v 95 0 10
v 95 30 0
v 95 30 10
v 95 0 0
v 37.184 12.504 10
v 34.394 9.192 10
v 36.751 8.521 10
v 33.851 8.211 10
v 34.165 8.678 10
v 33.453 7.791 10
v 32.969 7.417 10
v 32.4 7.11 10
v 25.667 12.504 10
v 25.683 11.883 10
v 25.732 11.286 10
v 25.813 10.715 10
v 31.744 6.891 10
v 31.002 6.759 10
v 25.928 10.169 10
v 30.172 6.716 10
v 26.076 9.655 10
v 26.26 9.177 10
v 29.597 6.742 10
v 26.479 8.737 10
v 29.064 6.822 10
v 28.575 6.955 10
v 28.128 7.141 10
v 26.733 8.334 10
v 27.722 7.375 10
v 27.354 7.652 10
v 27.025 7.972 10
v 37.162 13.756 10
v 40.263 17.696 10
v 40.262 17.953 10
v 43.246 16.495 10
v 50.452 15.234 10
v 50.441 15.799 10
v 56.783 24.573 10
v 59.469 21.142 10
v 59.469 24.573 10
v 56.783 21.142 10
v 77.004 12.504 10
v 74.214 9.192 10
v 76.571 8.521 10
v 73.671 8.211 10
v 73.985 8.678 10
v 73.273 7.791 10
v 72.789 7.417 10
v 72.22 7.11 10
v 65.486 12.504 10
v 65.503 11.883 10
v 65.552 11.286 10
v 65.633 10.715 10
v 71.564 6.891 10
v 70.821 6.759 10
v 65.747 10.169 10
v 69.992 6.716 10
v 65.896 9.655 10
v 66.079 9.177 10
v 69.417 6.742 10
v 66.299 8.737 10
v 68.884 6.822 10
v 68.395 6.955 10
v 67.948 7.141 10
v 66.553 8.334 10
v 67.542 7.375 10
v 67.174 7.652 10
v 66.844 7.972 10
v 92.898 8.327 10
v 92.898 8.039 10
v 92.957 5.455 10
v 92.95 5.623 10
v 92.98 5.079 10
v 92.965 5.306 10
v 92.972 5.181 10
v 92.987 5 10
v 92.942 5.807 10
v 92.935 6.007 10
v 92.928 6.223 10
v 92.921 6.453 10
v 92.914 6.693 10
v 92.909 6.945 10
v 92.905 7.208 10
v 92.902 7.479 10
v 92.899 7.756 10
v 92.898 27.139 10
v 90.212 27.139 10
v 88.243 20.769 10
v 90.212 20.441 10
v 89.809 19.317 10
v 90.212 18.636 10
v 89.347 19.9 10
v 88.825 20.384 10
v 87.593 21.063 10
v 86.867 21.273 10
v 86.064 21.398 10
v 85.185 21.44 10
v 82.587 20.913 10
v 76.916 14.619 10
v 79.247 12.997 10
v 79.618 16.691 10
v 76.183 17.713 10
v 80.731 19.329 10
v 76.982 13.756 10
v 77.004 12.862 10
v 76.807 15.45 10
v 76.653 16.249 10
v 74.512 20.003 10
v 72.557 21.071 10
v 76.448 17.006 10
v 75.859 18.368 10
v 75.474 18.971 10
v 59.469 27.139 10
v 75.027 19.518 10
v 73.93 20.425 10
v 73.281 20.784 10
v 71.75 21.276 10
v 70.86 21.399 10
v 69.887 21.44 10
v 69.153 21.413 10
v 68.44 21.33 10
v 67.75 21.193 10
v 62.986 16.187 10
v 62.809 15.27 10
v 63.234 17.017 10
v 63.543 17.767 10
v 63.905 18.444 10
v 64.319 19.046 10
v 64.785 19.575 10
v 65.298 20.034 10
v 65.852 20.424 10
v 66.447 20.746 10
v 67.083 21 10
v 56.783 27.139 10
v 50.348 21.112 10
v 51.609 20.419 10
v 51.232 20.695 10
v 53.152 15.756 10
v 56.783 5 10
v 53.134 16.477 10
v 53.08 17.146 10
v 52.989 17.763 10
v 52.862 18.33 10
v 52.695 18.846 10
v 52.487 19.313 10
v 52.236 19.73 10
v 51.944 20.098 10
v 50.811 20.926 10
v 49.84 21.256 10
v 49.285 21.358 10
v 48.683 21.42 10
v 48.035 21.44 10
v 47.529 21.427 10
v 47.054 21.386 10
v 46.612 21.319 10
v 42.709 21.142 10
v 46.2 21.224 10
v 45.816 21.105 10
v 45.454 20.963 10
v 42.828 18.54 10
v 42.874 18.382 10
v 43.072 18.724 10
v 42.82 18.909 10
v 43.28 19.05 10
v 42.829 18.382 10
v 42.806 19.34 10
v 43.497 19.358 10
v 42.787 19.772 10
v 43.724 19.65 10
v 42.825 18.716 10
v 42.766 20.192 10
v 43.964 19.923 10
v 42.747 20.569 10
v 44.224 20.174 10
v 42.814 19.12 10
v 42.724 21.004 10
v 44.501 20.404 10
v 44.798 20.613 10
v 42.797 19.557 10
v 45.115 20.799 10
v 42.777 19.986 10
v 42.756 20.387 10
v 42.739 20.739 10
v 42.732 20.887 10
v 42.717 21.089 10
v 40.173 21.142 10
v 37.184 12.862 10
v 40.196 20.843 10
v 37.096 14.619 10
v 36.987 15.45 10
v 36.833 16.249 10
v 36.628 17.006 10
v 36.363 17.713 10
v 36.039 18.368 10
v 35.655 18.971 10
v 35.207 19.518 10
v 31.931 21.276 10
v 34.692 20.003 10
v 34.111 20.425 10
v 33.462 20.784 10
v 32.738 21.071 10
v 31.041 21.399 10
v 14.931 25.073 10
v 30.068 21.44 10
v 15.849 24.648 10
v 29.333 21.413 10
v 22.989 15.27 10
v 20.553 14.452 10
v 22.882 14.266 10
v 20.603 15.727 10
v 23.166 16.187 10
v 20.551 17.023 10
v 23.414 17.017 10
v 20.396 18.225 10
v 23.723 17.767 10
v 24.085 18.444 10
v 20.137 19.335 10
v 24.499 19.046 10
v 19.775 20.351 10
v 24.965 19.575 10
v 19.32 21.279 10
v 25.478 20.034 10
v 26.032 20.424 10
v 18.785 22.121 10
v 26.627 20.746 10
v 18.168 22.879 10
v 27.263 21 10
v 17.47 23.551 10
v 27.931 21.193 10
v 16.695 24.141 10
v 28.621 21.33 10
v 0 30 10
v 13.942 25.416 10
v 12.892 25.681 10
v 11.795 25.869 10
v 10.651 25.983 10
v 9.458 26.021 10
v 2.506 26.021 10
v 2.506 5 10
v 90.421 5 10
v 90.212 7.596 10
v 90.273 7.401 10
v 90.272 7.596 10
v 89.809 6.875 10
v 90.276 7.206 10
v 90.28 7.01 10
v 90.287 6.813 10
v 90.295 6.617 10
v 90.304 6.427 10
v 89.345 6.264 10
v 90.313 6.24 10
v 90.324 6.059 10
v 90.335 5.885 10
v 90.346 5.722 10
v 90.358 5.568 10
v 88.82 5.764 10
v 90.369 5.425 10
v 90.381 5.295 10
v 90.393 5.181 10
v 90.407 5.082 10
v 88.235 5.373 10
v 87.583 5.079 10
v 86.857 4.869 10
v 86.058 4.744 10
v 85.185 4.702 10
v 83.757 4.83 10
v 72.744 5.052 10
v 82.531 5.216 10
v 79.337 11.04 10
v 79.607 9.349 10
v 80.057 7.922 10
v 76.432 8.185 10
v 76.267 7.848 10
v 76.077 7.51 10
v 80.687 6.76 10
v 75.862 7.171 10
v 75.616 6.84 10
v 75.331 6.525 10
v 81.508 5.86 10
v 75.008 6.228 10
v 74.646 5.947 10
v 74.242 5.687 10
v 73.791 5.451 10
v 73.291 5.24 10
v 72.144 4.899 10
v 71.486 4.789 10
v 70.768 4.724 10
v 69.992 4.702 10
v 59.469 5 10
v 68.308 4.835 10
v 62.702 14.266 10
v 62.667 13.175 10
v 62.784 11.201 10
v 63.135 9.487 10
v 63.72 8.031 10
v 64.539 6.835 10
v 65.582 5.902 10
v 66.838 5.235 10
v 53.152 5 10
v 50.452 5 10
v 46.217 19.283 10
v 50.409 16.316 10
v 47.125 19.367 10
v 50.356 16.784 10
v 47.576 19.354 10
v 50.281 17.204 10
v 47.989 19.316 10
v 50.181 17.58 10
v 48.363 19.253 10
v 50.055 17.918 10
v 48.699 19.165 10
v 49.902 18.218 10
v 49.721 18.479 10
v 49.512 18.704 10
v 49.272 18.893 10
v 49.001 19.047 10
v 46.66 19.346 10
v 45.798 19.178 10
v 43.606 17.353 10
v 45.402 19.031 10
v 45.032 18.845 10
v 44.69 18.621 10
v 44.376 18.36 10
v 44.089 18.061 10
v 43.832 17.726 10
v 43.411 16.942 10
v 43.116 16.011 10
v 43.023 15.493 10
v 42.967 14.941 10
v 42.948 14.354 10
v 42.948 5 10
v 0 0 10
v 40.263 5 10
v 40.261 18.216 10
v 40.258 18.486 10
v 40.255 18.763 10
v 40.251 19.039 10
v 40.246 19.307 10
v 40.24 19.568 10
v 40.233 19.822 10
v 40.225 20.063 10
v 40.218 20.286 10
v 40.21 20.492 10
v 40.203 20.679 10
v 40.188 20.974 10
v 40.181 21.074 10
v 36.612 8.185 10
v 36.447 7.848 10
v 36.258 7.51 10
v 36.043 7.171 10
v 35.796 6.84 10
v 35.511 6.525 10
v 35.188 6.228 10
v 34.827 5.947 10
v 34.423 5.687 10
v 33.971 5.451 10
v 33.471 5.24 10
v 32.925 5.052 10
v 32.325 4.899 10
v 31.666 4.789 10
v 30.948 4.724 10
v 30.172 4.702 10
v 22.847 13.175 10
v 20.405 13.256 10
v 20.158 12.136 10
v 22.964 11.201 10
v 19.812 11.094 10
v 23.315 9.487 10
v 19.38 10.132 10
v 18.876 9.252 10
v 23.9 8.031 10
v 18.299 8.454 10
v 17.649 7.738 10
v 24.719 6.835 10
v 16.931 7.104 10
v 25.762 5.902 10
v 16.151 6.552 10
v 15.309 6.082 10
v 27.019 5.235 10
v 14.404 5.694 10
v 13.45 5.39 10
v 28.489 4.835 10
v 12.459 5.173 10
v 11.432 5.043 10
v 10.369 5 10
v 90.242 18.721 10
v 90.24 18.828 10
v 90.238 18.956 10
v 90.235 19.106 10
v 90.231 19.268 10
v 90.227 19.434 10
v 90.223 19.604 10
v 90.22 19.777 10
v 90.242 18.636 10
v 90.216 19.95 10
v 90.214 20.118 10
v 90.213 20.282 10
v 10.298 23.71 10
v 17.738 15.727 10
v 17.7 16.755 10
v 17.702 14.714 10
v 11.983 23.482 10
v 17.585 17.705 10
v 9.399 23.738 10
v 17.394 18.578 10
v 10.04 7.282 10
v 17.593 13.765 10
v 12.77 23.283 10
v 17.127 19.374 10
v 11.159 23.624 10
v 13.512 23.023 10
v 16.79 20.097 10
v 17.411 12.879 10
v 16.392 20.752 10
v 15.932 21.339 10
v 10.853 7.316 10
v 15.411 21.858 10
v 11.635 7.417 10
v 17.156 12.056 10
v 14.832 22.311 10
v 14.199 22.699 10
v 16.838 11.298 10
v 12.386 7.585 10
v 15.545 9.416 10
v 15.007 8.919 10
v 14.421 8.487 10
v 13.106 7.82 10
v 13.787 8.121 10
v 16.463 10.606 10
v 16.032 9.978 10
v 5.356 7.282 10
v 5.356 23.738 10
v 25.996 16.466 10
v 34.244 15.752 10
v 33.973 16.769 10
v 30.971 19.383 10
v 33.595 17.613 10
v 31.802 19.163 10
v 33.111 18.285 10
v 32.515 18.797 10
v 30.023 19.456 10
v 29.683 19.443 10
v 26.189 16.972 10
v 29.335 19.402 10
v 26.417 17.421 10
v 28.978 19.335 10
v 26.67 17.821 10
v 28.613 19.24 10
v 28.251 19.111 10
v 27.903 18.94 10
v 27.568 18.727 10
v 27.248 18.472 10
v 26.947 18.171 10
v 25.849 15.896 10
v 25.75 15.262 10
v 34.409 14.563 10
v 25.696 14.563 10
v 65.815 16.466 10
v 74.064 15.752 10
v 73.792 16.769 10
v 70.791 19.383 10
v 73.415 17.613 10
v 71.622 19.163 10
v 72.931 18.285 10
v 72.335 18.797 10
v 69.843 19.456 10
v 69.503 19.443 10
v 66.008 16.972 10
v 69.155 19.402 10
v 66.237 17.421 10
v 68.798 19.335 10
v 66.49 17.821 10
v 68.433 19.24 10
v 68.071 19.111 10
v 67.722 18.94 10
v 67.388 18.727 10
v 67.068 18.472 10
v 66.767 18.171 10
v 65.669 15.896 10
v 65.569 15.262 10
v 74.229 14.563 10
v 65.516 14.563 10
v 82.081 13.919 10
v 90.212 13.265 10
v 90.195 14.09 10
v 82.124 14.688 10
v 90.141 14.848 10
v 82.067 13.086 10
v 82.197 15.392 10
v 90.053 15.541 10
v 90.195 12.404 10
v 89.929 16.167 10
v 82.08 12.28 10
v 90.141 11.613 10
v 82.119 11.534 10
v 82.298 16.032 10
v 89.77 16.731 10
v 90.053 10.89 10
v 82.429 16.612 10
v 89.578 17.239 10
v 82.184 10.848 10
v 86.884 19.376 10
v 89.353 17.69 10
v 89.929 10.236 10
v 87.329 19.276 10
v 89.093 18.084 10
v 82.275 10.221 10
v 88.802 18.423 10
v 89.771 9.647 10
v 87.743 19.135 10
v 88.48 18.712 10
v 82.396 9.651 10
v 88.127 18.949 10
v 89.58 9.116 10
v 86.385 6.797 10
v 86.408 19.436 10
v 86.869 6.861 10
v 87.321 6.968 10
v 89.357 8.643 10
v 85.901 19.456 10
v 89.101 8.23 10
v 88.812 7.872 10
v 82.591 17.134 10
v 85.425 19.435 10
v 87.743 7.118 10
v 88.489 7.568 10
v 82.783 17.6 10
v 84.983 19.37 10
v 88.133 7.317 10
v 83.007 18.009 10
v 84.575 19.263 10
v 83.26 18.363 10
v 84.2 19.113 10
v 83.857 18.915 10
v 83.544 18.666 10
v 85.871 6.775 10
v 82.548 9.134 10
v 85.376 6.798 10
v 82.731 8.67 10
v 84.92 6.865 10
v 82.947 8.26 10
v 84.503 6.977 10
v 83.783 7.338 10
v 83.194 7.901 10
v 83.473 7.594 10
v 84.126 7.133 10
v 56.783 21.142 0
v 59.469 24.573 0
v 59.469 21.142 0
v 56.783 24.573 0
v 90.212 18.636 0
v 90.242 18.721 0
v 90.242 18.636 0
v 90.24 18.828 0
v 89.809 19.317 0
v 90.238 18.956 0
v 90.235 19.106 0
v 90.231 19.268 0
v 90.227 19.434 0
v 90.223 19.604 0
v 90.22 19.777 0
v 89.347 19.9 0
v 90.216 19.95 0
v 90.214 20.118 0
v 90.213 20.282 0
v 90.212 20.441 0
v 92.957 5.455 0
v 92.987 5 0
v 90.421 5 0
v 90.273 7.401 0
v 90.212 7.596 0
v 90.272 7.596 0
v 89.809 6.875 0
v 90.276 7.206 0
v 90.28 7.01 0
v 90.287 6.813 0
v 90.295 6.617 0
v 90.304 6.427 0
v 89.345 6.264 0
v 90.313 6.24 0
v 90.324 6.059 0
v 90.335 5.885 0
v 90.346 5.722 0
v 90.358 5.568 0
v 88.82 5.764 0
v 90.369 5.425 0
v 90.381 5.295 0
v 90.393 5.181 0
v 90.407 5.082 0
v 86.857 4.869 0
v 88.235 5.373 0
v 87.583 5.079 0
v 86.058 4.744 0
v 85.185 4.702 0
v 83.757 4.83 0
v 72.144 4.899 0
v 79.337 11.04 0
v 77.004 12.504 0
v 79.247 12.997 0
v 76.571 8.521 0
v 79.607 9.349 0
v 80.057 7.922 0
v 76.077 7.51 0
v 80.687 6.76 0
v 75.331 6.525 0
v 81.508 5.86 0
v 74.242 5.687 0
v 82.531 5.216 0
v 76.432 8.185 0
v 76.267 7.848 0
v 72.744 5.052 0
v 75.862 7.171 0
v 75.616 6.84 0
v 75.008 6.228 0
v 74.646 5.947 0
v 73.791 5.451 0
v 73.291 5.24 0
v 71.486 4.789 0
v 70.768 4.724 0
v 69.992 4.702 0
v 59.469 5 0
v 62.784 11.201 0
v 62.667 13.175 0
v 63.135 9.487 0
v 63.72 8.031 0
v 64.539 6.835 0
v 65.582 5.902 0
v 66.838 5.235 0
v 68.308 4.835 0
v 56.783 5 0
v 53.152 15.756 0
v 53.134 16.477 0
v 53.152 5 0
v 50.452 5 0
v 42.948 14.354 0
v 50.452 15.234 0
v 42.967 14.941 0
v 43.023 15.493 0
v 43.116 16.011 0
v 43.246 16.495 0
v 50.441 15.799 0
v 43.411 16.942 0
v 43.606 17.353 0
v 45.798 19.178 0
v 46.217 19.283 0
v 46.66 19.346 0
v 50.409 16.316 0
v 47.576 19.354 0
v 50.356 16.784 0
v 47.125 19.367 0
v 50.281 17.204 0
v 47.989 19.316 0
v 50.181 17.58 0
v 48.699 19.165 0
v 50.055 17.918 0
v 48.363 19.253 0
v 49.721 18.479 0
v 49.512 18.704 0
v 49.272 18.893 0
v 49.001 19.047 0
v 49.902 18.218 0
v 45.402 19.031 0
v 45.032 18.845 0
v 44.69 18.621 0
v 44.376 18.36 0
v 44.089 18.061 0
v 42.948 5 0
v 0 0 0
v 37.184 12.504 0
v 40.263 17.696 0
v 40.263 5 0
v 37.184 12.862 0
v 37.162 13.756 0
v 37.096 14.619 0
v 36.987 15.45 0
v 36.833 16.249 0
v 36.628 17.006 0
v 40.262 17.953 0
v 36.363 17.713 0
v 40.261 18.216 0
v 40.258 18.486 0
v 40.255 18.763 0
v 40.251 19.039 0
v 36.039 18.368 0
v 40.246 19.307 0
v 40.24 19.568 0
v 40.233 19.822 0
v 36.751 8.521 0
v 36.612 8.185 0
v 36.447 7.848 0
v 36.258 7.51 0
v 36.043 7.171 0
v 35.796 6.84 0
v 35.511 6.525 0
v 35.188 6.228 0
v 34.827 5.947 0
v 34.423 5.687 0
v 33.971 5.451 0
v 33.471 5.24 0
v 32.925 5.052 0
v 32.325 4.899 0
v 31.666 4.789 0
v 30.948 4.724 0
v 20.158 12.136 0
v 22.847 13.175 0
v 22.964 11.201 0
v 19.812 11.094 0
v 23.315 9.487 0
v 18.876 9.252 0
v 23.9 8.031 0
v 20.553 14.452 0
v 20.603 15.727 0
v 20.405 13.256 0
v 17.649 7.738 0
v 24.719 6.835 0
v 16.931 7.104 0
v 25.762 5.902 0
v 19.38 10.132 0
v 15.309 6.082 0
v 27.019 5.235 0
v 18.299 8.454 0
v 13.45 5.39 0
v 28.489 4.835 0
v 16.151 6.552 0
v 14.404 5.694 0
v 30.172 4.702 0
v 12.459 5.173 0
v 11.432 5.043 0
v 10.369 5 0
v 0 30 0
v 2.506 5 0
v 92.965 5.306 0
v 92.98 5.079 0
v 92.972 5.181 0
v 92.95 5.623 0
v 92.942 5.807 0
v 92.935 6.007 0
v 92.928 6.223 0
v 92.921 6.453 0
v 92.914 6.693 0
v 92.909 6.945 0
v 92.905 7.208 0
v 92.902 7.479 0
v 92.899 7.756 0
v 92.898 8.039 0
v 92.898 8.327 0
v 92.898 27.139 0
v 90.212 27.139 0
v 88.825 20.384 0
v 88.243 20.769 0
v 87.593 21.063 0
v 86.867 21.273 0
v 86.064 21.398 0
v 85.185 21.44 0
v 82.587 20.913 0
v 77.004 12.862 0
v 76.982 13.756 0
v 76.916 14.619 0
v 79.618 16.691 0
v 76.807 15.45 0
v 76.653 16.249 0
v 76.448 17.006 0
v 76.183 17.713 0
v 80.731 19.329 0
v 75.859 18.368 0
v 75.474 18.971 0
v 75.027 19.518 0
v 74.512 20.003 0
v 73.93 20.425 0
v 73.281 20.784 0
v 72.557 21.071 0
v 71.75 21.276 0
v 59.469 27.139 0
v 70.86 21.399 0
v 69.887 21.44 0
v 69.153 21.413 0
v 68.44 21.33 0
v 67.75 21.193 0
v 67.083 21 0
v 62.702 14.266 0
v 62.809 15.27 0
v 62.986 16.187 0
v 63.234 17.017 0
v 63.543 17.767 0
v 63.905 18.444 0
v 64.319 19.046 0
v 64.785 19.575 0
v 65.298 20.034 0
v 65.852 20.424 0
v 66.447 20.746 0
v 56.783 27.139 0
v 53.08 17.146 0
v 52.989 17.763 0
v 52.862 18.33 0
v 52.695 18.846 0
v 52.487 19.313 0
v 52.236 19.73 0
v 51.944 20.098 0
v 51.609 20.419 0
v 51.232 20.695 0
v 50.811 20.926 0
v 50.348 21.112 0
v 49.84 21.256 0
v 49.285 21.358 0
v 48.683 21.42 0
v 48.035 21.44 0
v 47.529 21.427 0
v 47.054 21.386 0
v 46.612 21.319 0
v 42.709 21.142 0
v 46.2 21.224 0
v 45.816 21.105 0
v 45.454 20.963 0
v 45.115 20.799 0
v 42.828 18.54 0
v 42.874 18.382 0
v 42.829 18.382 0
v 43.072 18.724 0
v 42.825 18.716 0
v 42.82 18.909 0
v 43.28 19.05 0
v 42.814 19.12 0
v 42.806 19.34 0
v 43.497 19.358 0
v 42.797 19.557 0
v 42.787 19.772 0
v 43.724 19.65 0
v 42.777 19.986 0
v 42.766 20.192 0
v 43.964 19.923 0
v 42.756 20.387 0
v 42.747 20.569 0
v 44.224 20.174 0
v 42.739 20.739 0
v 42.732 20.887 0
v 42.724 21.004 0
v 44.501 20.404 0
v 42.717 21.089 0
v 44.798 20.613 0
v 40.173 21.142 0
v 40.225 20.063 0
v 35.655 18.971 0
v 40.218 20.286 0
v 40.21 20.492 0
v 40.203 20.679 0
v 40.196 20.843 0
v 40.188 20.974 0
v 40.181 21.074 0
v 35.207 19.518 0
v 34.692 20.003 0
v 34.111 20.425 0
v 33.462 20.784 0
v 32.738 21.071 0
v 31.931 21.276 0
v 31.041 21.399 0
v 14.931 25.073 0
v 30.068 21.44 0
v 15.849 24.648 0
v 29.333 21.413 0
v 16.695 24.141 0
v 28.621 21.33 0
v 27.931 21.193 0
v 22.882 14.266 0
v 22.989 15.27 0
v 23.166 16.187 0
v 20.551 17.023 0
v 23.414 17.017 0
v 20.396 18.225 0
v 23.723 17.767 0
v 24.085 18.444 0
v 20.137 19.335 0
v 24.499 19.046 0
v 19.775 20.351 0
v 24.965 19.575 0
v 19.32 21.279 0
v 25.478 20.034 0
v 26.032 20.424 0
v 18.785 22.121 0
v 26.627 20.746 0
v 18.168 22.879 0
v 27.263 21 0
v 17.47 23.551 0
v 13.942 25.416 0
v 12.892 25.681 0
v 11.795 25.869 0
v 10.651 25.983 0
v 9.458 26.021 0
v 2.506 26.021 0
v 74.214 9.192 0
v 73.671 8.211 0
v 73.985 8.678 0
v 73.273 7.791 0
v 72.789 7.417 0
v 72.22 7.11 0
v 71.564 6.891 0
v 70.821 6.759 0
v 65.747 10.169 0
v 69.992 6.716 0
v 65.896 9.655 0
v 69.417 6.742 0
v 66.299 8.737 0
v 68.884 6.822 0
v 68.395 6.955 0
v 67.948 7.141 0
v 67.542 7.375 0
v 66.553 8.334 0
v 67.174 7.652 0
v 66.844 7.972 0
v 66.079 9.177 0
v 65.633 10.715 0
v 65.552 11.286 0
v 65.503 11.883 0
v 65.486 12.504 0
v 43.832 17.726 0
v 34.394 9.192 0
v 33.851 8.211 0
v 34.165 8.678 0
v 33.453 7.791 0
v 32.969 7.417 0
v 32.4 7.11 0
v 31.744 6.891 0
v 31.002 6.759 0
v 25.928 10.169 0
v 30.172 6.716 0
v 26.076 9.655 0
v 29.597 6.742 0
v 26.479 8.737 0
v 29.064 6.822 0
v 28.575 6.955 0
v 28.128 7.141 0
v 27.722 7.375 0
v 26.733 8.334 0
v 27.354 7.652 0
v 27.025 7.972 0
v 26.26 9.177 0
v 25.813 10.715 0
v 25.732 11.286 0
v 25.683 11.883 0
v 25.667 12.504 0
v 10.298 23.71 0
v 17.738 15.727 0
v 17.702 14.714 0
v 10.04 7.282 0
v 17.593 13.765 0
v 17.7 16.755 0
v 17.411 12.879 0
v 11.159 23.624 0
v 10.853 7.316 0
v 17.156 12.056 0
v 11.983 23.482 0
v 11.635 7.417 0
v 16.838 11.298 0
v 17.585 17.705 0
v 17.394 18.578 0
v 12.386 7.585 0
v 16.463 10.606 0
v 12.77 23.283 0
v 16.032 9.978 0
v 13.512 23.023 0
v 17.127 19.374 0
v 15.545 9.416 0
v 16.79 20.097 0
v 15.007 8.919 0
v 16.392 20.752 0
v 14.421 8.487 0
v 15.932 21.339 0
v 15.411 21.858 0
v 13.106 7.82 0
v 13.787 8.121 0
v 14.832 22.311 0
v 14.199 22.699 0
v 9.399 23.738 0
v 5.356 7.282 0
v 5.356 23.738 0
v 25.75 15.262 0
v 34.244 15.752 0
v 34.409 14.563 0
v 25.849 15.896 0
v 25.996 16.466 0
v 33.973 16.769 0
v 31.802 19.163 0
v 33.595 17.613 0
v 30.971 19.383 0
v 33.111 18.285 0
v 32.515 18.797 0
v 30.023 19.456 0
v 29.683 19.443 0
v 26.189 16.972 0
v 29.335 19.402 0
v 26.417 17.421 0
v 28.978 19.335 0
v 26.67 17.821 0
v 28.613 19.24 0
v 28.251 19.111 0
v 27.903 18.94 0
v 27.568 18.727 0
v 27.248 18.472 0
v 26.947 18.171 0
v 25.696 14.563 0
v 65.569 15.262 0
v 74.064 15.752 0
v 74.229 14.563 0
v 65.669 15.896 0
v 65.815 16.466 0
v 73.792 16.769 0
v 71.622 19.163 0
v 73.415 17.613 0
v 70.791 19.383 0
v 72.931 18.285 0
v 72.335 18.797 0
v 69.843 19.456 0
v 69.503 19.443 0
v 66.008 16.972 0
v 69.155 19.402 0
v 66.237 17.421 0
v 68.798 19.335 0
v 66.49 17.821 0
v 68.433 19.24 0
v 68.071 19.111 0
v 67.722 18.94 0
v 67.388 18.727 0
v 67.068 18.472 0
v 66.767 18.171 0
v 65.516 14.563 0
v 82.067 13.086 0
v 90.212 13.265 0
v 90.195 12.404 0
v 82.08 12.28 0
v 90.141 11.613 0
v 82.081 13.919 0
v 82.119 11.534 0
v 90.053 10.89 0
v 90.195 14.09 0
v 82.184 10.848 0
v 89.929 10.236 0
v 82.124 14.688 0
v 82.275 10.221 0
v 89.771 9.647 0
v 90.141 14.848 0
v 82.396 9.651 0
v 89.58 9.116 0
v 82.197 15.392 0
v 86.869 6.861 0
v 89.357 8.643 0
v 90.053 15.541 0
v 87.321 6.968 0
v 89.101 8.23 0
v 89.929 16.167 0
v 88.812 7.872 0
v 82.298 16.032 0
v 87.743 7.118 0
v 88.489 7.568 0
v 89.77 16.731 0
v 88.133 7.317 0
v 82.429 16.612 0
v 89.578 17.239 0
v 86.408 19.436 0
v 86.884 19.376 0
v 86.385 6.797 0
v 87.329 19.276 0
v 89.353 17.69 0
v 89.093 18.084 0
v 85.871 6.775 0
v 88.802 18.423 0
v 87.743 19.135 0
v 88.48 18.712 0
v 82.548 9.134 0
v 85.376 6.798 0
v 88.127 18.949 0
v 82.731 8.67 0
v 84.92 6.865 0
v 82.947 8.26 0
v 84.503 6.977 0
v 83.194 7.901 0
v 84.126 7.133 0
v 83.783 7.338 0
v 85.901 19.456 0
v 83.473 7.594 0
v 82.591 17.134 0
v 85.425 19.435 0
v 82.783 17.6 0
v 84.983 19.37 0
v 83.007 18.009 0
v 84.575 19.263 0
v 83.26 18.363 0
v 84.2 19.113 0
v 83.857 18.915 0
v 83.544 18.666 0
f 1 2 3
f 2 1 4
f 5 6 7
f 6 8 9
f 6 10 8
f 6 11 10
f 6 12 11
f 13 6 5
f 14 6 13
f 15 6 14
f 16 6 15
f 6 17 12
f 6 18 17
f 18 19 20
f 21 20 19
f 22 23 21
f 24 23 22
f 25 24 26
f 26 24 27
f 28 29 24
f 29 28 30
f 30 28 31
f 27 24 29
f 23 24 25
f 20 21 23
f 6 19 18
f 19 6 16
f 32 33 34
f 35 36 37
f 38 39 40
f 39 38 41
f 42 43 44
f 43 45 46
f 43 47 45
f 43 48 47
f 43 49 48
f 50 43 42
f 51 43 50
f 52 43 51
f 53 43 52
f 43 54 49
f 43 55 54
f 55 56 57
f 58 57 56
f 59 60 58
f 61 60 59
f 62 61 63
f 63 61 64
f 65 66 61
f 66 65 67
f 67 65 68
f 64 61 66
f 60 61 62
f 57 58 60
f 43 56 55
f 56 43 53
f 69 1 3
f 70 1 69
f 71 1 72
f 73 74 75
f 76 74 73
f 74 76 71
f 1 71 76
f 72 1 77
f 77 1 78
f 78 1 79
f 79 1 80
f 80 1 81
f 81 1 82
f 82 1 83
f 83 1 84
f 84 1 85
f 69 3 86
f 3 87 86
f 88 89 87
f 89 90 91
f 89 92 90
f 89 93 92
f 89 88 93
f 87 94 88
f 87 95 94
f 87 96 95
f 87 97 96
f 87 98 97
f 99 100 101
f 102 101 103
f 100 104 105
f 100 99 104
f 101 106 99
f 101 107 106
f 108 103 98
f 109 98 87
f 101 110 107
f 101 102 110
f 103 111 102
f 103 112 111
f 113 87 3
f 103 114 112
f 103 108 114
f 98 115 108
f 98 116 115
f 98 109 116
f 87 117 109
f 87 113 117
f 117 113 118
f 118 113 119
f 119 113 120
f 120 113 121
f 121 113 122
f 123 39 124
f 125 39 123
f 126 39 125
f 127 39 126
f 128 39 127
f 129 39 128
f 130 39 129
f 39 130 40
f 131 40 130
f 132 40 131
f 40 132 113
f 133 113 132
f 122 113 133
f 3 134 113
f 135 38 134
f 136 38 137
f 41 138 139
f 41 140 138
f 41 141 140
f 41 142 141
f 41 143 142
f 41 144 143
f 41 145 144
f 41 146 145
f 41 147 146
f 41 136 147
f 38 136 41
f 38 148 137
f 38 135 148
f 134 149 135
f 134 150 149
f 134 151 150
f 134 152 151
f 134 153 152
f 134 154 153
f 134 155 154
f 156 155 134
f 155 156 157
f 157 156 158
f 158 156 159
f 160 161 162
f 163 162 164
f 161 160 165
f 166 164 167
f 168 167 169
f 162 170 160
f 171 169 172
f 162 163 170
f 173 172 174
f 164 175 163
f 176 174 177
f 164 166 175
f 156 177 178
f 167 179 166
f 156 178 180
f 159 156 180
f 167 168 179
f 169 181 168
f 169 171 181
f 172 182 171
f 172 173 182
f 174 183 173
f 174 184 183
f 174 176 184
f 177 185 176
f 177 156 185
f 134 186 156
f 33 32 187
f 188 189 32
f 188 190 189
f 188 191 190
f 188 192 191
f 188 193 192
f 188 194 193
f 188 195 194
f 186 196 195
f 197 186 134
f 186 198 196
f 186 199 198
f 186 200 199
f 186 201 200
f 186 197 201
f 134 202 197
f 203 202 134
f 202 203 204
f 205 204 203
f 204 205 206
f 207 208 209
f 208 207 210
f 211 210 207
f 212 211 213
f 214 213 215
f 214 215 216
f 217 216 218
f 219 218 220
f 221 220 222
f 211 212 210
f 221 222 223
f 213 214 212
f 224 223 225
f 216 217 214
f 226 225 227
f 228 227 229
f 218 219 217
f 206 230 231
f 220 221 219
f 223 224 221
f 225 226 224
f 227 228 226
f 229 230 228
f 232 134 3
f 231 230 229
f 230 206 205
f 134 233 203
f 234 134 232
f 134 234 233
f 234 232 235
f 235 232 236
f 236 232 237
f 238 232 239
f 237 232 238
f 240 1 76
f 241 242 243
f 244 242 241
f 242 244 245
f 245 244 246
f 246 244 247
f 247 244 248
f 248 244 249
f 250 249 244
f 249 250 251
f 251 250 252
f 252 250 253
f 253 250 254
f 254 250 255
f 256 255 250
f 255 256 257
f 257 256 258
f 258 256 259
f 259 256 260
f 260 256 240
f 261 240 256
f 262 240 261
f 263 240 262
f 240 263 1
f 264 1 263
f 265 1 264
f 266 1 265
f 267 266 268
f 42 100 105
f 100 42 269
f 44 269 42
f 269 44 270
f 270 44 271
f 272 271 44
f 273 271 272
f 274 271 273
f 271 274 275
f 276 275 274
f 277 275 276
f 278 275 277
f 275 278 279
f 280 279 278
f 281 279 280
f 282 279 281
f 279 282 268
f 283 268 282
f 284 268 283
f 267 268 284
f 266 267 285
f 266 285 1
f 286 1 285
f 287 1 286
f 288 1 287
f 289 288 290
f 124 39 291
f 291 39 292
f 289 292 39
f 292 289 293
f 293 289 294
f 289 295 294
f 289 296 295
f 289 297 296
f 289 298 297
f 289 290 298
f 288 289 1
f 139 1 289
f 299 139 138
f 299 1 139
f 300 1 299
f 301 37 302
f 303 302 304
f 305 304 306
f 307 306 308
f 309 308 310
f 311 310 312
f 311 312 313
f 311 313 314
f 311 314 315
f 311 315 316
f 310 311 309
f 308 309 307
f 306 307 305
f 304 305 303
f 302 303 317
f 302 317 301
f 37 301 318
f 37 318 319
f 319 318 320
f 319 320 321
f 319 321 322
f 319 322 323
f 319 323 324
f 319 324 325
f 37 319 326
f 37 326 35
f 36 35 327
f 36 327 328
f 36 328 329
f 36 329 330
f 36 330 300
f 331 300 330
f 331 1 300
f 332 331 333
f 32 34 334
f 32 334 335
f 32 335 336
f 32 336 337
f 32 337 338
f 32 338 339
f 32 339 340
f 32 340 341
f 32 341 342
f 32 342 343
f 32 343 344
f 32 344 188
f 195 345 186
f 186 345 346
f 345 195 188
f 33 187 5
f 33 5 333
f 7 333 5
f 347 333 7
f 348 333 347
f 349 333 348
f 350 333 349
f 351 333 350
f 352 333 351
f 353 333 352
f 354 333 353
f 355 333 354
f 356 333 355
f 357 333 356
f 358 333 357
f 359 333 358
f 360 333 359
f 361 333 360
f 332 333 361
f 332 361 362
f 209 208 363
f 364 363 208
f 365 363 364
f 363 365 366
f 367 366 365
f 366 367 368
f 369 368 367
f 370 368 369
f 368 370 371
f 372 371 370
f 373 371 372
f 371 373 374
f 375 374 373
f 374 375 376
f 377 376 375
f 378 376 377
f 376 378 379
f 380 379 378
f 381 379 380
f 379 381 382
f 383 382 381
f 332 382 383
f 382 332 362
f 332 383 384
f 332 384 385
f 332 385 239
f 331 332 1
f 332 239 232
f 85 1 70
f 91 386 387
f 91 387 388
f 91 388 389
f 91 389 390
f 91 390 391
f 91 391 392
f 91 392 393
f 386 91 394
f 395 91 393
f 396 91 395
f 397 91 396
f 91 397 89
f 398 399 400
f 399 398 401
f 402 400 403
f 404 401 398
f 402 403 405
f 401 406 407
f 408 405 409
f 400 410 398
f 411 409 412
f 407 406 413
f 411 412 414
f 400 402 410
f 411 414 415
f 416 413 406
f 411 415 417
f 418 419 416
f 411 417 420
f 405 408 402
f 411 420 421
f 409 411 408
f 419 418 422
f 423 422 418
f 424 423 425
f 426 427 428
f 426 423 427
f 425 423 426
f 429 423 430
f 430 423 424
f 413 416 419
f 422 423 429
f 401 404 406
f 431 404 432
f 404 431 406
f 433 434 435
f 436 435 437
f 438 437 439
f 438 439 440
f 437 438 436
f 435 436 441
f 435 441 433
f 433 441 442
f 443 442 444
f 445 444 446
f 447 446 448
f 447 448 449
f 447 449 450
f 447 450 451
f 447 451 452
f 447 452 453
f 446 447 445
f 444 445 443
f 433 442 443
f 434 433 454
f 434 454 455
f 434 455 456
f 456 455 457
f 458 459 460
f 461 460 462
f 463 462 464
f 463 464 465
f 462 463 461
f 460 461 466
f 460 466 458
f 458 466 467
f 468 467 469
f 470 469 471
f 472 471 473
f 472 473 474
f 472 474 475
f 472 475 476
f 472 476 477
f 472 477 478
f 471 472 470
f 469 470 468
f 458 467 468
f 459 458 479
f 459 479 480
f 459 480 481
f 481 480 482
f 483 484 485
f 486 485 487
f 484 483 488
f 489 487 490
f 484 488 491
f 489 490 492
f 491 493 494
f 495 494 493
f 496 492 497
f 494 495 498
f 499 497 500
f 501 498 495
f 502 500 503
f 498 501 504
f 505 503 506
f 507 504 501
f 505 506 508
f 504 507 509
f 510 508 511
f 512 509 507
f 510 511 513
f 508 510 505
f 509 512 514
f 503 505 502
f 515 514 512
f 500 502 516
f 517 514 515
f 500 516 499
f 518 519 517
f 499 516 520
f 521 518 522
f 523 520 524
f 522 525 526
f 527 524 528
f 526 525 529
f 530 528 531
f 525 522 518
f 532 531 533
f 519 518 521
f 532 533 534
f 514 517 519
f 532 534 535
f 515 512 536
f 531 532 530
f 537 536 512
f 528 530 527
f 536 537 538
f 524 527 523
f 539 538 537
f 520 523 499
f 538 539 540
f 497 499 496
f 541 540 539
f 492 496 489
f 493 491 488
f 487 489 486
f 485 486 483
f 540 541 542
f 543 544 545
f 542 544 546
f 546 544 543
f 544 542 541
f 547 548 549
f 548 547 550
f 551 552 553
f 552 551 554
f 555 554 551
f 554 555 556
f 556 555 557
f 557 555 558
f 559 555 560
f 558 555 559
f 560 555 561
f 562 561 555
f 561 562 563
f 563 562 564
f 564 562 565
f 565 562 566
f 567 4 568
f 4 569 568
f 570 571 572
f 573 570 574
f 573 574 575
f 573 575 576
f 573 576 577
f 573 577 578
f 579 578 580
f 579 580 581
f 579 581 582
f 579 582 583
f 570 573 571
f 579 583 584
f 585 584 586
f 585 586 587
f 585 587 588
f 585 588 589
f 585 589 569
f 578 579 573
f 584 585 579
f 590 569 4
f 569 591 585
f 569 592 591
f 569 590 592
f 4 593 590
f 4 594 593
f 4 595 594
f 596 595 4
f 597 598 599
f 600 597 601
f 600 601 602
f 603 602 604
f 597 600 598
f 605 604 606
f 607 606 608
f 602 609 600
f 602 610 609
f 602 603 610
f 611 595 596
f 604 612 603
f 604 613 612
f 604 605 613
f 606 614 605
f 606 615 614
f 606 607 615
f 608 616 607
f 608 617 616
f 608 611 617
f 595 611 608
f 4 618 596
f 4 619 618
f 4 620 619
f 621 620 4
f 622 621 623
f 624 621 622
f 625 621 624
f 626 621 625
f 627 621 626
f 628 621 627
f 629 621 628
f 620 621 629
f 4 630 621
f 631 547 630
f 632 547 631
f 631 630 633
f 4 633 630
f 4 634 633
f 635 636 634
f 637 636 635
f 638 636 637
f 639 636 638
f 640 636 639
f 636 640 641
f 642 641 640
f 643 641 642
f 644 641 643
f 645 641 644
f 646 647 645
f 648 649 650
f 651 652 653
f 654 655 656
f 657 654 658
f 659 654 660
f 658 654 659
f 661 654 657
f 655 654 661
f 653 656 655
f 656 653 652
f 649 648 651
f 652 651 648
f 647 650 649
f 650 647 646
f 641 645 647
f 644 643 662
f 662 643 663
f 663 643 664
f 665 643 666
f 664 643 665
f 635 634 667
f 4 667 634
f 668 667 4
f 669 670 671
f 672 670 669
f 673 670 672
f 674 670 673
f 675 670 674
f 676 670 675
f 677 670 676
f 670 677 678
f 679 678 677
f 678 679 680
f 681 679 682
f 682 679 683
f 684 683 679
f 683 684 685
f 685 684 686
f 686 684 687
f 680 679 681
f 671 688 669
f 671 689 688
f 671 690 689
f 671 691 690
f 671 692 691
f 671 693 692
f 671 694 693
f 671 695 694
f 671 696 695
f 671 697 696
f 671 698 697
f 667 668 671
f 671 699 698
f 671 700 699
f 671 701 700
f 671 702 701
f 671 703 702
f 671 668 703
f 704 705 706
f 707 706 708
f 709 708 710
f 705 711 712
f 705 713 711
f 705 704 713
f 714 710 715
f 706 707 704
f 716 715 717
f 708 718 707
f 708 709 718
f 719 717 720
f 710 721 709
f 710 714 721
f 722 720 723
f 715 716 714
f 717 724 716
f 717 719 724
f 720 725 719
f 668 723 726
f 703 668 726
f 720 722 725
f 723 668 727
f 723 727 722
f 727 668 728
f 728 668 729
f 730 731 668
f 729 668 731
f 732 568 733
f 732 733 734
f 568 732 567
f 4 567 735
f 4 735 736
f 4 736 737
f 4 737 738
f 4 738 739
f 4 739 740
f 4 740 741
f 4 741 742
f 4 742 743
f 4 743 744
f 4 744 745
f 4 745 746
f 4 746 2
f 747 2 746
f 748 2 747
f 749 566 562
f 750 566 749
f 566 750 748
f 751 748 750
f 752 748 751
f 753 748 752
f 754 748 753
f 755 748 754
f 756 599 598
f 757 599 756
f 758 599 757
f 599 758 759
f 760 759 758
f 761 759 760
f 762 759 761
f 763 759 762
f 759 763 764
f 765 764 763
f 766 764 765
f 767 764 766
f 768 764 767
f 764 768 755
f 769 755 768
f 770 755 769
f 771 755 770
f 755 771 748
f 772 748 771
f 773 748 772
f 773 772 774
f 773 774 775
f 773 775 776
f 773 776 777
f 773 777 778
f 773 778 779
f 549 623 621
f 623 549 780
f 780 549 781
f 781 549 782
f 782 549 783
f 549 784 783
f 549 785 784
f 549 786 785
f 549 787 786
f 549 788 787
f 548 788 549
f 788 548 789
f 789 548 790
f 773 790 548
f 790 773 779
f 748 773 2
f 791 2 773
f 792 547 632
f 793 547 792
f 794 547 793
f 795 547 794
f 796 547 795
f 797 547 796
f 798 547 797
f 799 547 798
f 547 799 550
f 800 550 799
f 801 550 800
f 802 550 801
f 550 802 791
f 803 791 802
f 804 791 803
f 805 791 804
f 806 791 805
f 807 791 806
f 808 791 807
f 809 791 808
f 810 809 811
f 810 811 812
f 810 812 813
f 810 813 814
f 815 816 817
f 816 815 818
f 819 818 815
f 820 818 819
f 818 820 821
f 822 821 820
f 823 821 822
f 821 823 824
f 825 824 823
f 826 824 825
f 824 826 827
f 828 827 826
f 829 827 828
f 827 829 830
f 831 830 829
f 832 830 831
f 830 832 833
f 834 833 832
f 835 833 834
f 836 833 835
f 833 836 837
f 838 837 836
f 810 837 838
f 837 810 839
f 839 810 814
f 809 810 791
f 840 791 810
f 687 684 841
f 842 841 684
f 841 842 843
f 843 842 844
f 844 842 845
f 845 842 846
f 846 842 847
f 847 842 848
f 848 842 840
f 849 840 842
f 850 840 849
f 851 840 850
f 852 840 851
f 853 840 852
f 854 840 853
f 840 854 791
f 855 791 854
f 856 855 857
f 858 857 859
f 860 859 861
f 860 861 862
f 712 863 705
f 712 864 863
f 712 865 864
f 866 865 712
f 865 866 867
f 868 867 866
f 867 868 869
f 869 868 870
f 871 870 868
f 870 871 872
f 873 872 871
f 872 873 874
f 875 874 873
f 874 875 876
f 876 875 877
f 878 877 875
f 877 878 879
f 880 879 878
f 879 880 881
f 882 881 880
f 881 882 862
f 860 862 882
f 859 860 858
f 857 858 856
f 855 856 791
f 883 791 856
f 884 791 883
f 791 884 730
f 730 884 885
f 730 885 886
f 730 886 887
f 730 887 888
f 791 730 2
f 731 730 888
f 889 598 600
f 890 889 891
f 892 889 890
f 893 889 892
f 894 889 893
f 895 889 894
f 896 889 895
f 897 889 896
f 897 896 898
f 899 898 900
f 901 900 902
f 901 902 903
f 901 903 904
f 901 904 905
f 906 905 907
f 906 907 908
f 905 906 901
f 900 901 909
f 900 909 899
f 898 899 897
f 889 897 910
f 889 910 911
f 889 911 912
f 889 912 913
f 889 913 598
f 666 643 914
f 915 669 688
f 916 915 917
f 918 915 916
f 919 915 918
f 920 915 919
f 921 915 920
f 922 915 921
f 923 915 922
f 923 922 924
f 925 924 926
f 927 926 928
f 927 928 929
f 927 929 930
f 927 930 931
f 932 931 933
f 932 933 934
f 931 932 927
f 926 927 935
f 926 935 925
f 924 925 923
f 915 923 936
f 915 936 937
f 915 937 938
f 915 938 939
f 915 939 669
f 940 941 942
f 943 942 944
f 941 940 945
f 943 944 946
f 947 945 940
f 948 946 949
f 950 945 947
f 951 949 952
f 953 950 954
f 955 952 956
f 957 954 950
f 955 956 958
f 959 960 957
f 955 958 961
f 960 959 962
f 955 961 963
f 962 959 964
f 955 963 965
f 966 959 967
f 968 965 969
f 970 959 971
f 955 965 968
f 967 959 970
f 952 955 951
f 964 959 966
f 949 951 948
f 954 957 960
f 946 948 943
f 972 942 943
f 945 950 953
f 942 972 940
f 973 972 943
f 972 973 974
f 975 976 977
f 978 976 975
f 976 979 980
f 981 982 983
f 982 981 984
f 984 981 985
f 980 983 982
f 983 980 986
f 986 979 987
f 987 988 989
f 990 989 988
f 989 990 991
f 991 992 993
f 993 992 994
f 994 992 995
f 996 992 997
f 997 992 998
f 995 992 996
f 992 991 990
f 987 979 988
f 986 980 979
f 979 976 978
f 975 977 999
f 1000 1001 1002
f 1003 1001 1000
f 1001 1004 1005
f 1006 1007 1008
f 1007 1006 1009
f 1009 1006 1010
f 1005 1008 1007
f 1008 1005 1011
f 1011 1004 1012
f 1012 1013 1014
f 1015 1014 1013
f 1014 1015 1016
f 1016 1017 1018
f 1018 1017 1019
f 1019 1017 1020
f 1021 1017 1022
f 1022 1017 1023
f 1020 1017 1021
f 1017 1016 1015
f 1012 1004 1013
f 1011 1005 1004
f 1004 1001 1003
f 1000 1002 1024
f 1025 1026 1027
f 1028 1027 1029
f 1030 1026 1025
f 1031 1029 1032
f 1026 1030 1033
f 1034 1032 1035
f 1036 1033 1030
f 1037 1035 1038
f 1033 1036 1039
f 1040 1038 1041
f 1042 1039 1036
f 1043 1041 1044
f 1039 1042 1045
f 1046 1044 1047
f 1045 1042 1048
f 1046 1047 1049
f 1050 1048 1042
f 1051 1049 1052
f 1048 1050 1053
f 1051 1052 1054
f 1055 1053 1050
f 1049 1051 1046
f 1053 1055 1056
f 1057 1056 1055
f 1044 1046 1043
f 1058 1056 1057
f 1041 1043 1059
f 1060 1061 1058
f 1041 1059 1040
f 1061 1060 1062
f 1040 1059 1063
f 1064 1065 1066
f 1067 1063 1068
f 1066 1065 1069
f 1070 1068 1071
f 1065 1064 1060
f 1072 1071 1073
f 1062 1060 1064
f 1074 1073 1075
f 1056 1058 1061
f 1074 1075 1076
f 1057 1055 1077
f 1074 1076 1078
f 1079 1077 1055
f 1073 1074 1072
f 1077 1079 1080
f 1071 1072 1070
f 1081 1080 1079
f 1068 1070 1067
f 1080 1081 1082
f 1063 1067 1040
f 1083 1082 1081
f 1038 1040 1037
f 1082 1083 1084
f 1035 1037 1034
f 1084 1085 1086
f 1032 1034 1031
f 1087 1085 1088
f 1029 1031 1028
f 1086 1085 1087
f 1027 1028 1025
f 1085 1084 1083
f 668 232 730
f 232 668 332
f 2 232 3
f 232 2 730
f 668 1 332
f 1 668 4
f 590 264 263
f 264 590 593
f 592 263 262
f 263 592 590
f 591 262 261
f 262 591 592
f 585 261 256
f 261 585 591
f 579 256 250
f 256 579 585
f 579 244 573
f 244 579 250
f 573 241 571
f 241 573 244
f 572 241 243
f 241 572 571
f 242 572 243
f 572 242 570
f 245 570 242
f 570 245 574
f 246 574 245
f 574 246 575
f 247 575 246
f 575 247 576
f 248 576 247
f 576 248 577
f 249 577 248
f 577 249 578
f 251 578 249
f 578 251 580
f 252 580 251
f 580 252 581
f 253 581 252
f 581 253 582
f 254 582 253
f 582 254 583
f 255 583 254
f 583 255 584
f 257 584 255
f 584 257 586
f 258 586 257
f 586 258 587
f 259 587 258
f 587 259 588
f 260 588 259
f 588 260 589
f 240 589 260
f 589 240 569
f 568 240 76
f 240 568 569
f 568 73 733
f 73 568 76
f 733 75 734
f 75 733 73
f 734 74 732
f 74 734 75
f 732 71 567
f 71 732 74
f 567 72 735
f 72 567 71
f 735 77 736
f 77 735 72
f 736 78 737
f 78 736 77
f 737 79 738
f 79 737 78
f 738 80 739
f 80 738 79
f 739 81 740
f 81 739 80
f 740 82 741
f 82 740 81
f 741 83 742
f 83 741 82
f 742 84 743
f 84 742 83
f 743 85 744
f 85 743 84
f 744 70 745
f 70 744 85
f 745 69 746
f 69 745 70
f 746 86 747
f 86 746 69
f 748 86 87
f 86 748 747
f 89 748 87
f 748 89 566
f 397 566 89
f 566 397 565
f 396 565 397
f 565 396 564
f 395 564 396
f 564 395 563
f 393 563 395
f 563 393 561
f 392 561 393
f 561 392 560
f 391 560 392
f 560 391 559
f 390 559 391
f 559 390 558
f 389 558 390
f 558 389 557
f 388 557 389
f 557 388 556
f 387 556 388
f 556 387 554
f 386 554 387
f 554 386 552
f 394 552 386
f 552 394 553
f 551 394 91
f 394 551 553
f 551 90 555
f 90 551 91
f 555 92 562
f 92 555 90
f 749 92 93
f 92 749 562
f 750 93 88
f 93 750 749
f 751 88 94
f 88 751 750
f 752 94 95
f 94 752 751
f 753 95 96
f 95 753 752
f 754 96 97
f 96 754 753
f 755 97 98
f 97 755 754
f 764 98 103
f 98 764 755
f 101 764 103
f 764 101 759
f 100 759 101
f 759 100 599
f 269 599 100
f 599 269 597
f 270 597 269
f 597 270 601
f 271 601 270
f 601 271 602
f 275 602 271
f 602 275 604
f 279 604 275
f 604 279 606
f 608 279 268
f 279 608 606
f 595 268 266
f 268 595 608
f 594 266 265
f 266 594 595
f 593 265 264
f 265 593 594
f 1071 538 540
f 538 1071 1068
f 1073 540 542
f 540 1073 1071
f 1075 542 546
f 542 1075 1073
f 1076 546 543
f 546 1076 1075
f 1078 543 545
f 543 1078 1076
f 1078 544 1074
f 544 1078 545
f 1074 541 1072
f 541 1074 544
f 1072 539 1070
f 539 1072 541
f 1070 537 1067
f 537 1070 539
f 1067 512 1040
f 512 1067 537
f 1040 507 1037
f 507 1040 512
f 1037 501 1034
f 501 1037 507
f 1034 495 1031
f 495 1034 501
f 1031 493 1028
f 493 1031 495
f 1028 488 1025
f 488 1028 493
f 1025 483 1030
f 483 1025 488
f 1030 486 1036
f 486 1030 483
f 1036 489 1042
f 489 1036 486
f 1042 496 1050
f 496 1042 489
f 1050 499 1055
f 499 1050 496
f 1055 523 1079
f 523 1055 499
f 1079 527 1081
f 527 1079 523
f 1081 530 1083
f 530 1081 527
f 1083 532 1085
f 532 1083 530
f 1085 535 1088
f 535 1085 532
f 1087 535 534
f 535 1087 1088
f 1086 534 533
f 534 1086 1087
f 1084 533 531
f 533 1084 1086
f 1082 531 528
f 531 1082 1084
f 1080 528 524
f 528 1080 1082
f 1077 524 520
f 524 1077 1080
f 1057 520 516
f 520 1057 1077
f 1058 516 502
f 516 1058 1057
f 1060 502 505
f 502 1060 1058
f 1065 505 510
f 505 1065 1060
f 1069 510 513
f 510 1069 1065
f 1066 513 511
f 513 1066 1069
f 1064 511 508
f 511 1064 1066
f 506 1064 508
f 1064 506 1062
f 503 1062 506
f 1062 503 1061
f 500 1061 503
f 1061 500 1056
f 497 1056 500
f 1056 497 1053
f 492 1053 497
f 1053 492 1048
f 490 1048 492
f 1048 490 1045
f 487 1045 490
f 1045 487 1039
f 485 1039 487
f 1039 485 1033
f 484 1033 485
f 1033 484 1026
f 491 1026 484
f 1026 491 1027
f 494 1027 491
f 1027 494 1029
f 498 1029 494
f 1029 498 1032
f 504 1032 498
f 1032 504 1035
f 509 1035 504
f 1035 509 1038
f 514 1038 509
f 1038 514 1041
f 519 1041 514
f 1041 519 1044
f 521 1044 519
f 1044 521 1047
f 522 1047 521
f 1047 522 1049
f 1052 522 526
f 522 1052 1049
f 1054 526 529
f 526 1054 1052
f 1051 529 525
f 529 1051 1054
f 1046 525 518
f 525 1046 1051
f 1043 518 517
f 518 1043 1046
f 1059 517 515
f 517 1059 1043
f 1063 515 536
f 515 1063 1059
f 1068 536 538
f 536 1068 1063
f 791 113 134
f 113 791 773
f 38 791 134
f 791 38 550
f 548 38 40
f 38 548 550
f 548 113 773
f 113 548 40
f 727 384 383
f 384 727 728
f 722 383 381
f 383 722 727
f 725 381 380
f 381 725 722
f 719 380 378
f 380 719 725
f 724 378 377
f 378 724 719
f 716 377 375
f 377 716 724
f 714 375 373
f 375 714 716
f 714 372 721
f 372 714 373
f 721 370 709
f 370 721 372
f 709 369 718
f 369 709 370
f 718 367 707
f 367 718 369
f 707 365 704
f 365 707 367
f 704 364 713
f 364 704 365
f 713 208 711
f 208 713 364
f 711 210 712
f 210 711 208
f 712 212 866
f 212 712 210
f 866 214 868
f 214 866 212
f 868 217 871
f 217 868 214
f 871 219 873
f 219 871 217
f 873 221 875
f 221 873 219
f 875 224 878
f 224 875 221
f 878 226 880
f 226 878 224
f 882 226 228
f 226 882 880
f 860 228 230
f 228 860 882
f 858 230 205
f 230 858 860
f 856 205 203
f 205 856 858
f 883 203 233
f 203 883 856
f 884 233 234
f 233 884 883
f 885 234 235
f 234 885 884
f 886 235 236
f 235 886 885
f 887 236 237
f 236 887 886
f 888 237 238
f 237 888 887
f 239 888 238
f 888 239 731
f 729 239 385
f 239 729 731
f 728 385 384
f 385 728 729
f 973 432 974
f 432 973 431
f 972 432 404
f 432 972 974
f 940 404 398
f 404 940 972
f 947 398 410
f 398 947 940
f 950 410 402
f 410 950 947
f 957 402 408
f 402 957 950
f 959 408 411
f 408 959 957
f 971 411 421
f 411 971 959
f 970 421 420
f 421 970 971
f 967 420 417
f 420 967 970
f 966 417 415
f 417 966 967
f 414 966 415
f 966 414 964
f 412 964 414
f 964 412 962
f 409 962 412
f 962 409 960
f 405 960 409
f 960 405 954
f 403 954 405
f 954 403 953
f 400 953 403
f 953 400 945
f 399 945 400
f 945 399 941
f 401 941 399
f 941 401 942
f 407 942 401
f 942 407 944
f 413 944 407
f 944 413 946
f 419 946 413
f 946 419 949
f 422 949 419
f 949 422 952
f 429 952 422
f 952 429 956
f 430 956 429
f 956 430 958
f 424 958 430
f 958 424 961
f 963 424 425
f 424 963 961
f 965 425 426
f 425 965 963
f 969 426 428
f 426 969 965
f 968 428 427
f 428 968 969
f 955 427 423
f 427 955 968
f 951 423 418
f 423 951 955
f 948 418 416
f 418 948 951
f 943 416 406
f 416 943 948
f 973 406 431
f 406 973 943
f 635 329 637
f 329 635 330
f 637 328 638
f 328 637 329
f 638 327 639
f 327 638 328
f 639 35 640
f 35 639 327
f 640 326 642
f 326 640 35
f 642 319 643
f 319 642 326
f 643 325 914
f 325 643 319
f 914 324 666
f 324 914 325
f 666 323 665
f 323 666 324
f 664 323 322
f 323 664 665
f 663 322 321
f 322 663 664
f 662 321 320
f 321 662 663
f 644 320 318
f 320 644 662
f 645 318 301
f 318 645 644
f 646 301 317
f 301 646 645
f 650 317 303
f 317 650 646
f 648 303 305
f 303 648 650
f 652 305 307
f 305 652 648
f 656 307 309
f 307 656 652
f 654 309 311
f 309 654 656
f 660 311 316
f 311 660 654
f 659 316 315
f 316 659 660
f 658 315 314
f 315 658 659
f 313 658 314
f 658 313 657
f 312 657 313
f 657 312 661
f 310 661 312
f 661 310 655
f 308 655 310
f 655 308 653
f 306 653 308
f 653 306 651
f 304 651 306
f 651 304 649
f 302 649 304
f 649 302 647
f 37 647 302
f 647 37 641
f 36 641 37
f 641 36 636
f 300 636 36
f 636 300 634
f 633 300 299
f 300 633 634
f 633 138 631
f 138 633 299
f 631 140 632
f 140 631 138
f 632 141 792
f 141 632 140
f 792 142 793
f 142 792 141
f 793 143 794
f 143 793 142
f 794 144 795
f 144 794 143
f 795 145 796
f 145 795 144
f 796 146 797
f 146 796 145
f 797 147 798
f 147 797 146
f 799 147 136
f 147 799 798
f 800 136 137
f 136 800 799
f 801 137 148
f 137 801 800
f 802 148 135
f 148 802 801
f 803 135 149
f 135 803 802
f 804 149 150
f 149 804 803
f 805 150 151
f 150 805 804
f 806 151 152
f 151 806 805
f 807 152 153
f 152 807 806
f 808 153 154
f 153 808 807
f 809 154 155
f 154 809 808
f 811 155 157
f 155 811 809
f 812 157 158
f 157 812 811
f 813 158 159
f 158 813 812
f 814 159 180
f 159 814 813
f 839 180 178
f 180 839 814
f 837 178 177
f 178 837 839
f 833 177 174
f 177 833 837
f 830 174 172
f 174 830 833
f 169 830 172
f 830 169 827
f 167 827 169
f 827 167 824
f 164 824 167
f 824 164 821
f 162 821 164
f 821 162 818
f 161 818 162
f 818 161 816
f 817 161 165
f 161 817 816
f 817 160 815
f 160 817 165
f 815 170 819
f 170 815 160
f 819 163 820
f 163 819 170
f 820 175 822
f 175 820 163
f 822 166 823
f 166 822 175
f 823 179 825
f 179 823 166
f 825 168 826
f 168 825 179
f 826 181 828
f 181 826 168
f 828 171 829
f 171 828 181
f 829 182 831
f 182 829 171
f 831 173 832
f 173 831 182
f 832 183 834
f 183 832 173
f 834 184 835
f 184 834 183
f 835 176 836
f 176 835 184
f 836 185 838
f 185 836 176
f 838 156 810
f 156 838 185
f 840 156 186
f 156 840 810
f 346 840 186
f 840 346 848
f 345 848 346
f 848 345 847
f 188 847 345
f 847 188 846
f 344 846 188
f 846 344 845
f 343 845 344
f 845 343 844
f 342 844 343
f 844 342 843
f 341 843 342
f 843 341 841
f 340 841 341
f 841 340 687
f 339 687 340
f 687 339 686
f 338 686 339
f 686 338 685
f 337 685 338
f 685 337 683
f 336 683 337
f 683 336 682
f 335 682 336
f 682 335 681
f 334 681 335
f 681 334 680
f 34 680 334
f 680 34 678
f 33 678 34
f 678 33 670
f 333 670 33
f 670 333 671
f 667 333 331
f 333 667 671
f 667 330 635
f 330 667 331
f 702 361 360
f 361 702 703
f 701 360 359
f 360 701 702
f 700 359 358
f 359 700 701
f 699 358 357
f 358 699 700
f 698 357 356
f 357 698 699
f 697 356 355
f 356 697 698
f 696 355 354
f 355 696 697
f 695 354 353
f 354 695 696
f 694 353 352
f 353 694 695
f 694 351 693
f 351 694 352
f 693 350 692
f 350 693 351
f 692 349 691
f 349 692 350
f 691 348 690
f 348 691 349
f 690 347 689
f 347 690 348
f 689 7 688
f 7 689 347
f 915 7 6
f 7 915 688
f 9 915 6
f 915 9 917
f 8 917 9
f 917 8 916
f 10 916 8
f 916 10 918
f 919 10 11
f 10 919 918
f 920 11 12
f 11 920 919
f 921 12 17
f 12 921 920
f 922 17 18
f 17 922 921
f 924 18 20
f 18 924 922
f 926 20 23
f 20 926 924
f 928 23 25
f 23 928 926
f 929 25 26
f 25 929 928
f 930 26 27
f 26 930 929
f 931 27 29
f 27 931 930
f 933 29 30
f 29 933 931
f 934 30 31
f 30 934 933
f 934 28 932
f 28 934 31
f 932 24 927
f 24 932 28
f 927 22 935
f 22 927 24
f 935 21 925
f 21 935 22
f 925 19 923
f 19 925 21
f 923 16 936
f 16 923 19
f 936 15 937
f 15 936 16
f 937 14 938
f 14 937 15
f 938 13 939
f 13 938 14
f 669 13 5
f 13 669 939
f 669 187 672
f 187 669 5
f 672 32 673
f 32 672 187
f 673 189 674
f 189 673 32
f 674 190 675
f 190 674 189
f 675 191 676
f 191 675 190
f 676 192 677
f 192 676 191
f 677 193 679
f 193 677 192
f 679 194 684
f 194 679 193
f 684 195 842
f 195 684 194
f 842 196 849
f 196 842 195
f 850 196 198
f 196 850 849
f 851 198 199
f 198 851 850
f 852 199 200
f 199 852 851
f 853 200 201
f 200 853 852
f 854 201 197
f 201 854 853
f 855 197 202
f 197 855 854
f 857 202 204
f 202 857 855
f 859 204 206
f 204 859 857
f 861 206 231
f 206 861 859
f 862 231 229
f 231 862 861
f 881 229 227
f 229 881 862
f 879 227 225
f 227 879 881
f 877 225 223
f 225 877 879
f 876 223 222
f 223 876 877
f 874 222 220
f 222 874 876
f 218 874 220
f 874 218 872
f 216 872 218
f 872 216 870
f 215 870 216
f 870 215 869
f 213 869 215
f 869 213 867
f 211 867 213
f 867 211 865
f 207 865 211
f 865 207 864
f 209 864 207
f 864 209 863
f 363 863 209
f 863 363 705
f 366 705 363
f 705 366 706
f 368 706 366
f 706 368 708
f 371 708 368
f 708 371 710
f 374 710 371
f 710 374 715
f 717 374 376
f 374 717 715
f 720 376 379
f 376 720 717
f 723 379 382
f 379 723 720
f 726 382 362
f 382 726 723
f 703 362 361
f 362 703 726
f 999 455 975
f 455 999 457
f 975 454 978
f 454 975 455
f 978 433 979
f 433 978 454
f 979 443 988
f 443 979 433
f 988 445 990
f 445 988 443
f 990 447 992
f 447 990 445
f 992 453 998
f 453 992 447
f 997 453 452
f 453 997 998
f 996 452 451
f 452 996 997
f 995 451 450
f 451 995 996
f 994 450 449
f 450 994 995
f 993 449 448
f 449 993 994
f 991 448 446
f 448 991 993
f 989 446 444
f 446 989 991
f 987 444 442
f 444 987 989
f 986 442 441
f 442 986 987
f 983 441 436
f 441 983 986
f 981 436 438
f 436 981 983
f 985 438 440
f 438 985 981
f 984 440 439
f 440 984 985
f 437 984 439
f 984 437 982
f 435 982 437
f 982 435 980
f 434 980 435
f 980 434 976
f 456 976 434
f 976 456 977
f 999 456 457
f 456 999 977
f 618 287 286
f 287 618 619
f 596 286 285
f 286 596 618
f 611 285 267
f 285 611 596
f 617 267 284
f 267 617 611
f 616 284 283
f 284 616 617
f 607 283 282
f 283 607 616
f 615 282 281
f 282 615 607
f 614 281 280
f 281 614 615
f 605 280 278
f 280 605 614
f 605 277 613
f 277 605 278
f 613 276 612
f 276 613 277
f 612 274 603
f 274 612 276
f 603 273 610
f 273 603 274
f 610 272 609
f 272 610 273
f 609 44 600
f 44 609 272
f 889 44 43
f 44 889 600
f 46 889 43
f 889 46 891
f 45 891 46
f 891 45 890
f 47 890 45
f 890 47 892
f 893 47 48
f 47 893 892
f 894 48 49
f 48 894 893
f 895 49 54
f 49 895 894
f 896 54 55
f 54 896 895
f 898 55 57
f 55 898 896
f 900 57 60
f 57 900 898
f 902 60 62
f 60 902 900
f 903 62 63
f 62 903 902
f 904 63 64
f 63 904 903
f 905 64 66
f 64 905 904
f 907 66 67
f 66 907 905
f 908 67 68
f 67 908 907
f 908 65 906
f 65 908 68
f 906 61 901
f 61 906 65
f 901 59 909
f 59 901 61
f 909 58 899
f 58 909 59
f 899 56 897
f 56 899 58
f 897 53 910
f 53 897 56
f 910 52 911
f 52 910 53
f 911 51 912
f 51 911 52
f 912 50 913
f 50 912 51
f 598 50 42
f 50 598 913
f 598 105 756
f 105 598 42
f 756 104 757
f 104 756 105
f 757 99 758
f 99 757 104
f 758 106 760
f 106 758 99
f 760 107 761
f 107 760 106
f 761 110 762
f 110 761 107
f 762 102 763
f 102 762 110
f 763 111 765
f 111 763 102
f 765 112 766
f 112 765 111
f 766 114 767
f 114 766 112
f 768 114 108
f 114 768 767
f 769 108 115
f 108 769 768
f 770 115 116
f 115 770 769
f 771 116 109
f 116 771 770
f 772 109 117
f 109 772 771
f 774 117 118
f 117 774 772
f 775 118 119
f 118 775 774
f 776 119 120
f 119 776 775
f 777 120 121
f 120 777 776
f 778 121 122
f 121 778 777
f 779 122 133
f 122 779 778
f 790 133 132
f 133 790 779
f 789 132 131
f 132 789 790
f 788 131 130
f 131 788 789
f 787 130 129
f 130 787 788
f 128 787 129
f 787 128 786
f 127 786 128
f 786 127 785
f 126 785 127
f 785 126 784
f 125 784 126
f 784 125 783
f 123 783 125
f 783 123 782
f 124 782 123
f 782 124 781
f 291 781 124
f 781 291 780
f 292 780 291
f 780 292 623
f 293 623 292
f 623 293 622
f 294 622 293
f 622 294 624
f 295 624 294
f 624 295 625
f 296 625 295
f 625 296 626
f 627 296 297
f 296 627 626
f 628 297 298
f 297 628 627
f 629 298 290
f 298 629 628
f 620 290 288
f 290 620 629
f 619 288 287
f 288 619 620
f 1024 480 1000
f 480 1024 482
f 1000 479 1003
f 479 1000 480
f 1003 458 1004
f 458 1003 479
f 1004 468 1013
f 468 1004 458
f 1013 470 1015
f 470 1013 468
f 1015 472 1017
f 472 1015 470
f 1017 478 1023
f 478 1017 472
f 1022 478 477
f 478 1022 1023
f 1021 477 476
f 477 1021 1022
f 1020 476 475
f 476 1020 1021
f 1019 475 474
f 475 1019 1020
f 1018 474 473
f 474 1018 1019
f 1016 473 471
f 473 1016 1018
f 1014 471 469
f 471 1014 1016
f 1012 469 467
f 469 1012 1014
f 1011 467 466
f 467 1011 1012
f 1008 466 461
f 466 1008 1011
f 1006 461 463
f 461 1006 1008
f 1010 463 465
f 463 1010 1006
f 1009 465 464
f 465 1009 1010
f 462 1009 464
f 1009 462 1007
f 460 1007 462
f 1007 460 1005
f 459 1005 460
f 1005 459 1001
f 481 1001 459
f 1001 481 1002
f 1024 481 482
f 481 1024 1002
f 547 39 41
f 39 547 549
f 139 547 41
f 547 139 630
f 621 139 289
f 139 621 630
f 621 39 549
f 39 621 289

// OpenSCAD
difference() {
  cube(size=[95, 30, 10]);
  translate([0, 5, 0]) {
    linear_extrude(height=30, center=true) {
      text("Denied", 22);
    }
  }
}
